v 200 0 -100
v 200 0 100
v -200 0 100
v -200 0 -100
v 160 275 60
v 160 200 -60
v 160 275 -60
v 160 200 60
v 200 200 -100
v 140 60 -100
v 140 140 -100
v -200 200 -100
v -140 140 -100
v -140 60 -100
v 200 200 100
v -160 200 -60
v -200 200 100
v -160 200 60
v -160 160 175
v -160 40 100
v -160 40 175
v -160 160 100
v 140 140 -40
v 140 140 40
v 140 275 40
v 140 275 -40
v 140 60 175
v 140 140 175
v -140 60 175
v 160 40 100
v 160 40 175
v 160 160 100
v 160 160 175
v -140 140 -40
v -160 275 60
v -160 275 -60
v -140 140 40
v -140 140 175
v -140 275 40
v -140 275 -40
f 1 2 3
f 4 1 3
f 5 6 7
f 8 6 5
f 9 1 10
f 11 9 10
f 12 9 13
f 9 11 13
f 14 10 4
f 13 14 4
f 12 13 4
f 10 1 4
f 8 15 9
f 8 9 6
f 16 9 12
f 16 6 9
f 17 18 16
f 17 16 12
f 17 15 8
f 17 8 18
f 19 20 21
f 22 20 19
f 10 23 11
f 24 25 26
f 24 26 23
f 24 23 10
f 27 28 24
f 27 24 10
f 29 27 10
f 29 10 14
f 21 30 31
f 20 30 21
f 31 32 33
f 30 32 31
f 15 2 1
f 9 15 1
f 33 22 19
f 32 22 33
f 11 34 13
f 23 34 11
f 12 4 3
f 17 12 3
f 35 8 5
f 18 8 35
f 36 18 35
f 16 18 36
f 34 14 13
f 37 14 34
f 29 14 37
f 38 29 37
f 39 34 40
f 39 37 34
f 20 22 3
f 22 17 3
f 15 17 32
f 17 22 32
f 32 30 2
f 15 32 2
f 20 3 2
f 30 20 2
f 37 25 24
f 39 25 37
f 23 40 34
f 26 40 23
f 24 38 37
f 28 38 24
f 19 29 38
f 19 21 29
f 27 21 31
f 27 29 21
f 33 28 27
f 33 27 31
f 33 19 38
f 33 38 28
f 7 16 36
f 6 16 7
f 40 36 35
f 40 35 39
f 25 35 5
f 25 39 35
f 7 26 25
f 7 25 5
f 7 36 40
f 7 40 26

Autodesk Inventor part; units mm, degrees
ref_plane "YZ Plane" through (0, 0, 0) normal (1, 0, 0) x (0, 1, 0)
ref_plane "XZ Plane" through (0, 0, 0) normal (0, 1, 0) x (-1, 0, 0)
ref_plane "XY Plane" through (0, 0, 0) normal (0, 0, 1) x (1, 0, 0)
sketch "Sketch1" plane through (0, 0, 0) normal (0, 1, 0) x (-1, 0, 0)
  line L0 (200, 100) -> (-200, 100)
  line L1 (-200, 100) -> (-200, -100)
  line L2 (-200, -100) -> (200, -100)
  line L3 (200, -100) -> (200, 100)
  line L4 (0, -140) -> (0, 140) projected
  line L5 (-280, 0) -> (280, 0) projected
  point P0 (0, 0)
  dimension "d0" = 400
  dimension "d1" = 200
extrude "Extrusion1" add sketch "Sketch1" along normal blind 200
sketch "Sketch2" plane through (-200, 0, 100) normal (0, 0, 1) x (1, 0, 0)
  line L0 (0, 0) -> (400, 0) projected
  line L1 (400, 0) -> (400, 200) projected
  line L2 (0, 200) -> (400, 200) projected
  line L3 (0, 0) -> (0, 200) projected
  line L4 (360, 160) -> (360, 40)
  line L5 (360, 40) -> (40, 40)
  line L6 (40, 40) -> (40, 160)
  line L7 (40, 160) -> (360, 160)
  point P0 (200, 0)
  dimension "d4" = 40
extrude "Extrusion2" add sketch "Sketch2" along normal blind 75 contours L4 L5 L6 L7
sketch "Sketch3" plane through (-200, 0, 175) normal (0, 0, 1) x (1, 0, 0)
  line L0 (360, 40) -> (360, 160) projected
  line L1 (360, 160) -> (40, 160) projected
  line L2 (40, 160) -> (40, 40) projected
  line L3 (40, 40) -> (360, 40) projected
  line L4 (60, 140) -> (340, 140)
  line L5 (340, 140) -> (340, 60)
  line L6 (340, 60) -> (60, 60)
  line L7 (60, 60) -> (60, 140)
  point P0 (200, 0)
  dimension "d7" = 20
extrude "Extrusion3" cut sketch "Sketch3" against normal through all contours L4 L5 L6 L7
sketch "Sketch5" plane through (0, 200, 0) normal (0, 1, 0) x (1, 0, 0)
  line L0 (-200, -100) -> (200, -100) projected
  line L1 (200, -100) -> (200, 100) projected
  line L2 (200, 100) -> (-200, 100) projected
  line L3 (-200, 100) -> (-200, -100) projected
  line L4 (-160, 60) -> (160, 60)
  line L5 (160, 60) -> (160, -60)
  line L6 (160, -60) -> (-160, -60)
  line L7 (-160, -60) -> (-160, 60)
  point P0 (0, 0)
  dimension "d19" = 40
extrude "Extrusion4" add sketch "Sketch5" along normal blind 75 contours L4 L5 L6 L7
sketch "Sketch6" plane through (0, 275, 0) normal (0, 1, 0) x (1, 0, 0)
  line L0 (160, 60) -> (-160, 60) projected
  line L1 (-160, 60) -> (-160, -60) projected
  line L2 (-160, -60) -> (160, -60) projected
  line L3 (160, -60) -> (160, 60) projected
  line L4 (-140, 40) -> (140, 40)
  line L5 (140, 40) -> (140, -40)
  line L6 (140, -40) -> (-140, -40)
  line L7 (-140, -40) -> (-140, 40)
  point P0 (0, 0)
  dimension "d22" = 20
extrude "Extrusion5" cut sketch "Sketch6" against normal up to surface (135 mm away) contours L4 L5 L6 L7
properties part number "fillet"
